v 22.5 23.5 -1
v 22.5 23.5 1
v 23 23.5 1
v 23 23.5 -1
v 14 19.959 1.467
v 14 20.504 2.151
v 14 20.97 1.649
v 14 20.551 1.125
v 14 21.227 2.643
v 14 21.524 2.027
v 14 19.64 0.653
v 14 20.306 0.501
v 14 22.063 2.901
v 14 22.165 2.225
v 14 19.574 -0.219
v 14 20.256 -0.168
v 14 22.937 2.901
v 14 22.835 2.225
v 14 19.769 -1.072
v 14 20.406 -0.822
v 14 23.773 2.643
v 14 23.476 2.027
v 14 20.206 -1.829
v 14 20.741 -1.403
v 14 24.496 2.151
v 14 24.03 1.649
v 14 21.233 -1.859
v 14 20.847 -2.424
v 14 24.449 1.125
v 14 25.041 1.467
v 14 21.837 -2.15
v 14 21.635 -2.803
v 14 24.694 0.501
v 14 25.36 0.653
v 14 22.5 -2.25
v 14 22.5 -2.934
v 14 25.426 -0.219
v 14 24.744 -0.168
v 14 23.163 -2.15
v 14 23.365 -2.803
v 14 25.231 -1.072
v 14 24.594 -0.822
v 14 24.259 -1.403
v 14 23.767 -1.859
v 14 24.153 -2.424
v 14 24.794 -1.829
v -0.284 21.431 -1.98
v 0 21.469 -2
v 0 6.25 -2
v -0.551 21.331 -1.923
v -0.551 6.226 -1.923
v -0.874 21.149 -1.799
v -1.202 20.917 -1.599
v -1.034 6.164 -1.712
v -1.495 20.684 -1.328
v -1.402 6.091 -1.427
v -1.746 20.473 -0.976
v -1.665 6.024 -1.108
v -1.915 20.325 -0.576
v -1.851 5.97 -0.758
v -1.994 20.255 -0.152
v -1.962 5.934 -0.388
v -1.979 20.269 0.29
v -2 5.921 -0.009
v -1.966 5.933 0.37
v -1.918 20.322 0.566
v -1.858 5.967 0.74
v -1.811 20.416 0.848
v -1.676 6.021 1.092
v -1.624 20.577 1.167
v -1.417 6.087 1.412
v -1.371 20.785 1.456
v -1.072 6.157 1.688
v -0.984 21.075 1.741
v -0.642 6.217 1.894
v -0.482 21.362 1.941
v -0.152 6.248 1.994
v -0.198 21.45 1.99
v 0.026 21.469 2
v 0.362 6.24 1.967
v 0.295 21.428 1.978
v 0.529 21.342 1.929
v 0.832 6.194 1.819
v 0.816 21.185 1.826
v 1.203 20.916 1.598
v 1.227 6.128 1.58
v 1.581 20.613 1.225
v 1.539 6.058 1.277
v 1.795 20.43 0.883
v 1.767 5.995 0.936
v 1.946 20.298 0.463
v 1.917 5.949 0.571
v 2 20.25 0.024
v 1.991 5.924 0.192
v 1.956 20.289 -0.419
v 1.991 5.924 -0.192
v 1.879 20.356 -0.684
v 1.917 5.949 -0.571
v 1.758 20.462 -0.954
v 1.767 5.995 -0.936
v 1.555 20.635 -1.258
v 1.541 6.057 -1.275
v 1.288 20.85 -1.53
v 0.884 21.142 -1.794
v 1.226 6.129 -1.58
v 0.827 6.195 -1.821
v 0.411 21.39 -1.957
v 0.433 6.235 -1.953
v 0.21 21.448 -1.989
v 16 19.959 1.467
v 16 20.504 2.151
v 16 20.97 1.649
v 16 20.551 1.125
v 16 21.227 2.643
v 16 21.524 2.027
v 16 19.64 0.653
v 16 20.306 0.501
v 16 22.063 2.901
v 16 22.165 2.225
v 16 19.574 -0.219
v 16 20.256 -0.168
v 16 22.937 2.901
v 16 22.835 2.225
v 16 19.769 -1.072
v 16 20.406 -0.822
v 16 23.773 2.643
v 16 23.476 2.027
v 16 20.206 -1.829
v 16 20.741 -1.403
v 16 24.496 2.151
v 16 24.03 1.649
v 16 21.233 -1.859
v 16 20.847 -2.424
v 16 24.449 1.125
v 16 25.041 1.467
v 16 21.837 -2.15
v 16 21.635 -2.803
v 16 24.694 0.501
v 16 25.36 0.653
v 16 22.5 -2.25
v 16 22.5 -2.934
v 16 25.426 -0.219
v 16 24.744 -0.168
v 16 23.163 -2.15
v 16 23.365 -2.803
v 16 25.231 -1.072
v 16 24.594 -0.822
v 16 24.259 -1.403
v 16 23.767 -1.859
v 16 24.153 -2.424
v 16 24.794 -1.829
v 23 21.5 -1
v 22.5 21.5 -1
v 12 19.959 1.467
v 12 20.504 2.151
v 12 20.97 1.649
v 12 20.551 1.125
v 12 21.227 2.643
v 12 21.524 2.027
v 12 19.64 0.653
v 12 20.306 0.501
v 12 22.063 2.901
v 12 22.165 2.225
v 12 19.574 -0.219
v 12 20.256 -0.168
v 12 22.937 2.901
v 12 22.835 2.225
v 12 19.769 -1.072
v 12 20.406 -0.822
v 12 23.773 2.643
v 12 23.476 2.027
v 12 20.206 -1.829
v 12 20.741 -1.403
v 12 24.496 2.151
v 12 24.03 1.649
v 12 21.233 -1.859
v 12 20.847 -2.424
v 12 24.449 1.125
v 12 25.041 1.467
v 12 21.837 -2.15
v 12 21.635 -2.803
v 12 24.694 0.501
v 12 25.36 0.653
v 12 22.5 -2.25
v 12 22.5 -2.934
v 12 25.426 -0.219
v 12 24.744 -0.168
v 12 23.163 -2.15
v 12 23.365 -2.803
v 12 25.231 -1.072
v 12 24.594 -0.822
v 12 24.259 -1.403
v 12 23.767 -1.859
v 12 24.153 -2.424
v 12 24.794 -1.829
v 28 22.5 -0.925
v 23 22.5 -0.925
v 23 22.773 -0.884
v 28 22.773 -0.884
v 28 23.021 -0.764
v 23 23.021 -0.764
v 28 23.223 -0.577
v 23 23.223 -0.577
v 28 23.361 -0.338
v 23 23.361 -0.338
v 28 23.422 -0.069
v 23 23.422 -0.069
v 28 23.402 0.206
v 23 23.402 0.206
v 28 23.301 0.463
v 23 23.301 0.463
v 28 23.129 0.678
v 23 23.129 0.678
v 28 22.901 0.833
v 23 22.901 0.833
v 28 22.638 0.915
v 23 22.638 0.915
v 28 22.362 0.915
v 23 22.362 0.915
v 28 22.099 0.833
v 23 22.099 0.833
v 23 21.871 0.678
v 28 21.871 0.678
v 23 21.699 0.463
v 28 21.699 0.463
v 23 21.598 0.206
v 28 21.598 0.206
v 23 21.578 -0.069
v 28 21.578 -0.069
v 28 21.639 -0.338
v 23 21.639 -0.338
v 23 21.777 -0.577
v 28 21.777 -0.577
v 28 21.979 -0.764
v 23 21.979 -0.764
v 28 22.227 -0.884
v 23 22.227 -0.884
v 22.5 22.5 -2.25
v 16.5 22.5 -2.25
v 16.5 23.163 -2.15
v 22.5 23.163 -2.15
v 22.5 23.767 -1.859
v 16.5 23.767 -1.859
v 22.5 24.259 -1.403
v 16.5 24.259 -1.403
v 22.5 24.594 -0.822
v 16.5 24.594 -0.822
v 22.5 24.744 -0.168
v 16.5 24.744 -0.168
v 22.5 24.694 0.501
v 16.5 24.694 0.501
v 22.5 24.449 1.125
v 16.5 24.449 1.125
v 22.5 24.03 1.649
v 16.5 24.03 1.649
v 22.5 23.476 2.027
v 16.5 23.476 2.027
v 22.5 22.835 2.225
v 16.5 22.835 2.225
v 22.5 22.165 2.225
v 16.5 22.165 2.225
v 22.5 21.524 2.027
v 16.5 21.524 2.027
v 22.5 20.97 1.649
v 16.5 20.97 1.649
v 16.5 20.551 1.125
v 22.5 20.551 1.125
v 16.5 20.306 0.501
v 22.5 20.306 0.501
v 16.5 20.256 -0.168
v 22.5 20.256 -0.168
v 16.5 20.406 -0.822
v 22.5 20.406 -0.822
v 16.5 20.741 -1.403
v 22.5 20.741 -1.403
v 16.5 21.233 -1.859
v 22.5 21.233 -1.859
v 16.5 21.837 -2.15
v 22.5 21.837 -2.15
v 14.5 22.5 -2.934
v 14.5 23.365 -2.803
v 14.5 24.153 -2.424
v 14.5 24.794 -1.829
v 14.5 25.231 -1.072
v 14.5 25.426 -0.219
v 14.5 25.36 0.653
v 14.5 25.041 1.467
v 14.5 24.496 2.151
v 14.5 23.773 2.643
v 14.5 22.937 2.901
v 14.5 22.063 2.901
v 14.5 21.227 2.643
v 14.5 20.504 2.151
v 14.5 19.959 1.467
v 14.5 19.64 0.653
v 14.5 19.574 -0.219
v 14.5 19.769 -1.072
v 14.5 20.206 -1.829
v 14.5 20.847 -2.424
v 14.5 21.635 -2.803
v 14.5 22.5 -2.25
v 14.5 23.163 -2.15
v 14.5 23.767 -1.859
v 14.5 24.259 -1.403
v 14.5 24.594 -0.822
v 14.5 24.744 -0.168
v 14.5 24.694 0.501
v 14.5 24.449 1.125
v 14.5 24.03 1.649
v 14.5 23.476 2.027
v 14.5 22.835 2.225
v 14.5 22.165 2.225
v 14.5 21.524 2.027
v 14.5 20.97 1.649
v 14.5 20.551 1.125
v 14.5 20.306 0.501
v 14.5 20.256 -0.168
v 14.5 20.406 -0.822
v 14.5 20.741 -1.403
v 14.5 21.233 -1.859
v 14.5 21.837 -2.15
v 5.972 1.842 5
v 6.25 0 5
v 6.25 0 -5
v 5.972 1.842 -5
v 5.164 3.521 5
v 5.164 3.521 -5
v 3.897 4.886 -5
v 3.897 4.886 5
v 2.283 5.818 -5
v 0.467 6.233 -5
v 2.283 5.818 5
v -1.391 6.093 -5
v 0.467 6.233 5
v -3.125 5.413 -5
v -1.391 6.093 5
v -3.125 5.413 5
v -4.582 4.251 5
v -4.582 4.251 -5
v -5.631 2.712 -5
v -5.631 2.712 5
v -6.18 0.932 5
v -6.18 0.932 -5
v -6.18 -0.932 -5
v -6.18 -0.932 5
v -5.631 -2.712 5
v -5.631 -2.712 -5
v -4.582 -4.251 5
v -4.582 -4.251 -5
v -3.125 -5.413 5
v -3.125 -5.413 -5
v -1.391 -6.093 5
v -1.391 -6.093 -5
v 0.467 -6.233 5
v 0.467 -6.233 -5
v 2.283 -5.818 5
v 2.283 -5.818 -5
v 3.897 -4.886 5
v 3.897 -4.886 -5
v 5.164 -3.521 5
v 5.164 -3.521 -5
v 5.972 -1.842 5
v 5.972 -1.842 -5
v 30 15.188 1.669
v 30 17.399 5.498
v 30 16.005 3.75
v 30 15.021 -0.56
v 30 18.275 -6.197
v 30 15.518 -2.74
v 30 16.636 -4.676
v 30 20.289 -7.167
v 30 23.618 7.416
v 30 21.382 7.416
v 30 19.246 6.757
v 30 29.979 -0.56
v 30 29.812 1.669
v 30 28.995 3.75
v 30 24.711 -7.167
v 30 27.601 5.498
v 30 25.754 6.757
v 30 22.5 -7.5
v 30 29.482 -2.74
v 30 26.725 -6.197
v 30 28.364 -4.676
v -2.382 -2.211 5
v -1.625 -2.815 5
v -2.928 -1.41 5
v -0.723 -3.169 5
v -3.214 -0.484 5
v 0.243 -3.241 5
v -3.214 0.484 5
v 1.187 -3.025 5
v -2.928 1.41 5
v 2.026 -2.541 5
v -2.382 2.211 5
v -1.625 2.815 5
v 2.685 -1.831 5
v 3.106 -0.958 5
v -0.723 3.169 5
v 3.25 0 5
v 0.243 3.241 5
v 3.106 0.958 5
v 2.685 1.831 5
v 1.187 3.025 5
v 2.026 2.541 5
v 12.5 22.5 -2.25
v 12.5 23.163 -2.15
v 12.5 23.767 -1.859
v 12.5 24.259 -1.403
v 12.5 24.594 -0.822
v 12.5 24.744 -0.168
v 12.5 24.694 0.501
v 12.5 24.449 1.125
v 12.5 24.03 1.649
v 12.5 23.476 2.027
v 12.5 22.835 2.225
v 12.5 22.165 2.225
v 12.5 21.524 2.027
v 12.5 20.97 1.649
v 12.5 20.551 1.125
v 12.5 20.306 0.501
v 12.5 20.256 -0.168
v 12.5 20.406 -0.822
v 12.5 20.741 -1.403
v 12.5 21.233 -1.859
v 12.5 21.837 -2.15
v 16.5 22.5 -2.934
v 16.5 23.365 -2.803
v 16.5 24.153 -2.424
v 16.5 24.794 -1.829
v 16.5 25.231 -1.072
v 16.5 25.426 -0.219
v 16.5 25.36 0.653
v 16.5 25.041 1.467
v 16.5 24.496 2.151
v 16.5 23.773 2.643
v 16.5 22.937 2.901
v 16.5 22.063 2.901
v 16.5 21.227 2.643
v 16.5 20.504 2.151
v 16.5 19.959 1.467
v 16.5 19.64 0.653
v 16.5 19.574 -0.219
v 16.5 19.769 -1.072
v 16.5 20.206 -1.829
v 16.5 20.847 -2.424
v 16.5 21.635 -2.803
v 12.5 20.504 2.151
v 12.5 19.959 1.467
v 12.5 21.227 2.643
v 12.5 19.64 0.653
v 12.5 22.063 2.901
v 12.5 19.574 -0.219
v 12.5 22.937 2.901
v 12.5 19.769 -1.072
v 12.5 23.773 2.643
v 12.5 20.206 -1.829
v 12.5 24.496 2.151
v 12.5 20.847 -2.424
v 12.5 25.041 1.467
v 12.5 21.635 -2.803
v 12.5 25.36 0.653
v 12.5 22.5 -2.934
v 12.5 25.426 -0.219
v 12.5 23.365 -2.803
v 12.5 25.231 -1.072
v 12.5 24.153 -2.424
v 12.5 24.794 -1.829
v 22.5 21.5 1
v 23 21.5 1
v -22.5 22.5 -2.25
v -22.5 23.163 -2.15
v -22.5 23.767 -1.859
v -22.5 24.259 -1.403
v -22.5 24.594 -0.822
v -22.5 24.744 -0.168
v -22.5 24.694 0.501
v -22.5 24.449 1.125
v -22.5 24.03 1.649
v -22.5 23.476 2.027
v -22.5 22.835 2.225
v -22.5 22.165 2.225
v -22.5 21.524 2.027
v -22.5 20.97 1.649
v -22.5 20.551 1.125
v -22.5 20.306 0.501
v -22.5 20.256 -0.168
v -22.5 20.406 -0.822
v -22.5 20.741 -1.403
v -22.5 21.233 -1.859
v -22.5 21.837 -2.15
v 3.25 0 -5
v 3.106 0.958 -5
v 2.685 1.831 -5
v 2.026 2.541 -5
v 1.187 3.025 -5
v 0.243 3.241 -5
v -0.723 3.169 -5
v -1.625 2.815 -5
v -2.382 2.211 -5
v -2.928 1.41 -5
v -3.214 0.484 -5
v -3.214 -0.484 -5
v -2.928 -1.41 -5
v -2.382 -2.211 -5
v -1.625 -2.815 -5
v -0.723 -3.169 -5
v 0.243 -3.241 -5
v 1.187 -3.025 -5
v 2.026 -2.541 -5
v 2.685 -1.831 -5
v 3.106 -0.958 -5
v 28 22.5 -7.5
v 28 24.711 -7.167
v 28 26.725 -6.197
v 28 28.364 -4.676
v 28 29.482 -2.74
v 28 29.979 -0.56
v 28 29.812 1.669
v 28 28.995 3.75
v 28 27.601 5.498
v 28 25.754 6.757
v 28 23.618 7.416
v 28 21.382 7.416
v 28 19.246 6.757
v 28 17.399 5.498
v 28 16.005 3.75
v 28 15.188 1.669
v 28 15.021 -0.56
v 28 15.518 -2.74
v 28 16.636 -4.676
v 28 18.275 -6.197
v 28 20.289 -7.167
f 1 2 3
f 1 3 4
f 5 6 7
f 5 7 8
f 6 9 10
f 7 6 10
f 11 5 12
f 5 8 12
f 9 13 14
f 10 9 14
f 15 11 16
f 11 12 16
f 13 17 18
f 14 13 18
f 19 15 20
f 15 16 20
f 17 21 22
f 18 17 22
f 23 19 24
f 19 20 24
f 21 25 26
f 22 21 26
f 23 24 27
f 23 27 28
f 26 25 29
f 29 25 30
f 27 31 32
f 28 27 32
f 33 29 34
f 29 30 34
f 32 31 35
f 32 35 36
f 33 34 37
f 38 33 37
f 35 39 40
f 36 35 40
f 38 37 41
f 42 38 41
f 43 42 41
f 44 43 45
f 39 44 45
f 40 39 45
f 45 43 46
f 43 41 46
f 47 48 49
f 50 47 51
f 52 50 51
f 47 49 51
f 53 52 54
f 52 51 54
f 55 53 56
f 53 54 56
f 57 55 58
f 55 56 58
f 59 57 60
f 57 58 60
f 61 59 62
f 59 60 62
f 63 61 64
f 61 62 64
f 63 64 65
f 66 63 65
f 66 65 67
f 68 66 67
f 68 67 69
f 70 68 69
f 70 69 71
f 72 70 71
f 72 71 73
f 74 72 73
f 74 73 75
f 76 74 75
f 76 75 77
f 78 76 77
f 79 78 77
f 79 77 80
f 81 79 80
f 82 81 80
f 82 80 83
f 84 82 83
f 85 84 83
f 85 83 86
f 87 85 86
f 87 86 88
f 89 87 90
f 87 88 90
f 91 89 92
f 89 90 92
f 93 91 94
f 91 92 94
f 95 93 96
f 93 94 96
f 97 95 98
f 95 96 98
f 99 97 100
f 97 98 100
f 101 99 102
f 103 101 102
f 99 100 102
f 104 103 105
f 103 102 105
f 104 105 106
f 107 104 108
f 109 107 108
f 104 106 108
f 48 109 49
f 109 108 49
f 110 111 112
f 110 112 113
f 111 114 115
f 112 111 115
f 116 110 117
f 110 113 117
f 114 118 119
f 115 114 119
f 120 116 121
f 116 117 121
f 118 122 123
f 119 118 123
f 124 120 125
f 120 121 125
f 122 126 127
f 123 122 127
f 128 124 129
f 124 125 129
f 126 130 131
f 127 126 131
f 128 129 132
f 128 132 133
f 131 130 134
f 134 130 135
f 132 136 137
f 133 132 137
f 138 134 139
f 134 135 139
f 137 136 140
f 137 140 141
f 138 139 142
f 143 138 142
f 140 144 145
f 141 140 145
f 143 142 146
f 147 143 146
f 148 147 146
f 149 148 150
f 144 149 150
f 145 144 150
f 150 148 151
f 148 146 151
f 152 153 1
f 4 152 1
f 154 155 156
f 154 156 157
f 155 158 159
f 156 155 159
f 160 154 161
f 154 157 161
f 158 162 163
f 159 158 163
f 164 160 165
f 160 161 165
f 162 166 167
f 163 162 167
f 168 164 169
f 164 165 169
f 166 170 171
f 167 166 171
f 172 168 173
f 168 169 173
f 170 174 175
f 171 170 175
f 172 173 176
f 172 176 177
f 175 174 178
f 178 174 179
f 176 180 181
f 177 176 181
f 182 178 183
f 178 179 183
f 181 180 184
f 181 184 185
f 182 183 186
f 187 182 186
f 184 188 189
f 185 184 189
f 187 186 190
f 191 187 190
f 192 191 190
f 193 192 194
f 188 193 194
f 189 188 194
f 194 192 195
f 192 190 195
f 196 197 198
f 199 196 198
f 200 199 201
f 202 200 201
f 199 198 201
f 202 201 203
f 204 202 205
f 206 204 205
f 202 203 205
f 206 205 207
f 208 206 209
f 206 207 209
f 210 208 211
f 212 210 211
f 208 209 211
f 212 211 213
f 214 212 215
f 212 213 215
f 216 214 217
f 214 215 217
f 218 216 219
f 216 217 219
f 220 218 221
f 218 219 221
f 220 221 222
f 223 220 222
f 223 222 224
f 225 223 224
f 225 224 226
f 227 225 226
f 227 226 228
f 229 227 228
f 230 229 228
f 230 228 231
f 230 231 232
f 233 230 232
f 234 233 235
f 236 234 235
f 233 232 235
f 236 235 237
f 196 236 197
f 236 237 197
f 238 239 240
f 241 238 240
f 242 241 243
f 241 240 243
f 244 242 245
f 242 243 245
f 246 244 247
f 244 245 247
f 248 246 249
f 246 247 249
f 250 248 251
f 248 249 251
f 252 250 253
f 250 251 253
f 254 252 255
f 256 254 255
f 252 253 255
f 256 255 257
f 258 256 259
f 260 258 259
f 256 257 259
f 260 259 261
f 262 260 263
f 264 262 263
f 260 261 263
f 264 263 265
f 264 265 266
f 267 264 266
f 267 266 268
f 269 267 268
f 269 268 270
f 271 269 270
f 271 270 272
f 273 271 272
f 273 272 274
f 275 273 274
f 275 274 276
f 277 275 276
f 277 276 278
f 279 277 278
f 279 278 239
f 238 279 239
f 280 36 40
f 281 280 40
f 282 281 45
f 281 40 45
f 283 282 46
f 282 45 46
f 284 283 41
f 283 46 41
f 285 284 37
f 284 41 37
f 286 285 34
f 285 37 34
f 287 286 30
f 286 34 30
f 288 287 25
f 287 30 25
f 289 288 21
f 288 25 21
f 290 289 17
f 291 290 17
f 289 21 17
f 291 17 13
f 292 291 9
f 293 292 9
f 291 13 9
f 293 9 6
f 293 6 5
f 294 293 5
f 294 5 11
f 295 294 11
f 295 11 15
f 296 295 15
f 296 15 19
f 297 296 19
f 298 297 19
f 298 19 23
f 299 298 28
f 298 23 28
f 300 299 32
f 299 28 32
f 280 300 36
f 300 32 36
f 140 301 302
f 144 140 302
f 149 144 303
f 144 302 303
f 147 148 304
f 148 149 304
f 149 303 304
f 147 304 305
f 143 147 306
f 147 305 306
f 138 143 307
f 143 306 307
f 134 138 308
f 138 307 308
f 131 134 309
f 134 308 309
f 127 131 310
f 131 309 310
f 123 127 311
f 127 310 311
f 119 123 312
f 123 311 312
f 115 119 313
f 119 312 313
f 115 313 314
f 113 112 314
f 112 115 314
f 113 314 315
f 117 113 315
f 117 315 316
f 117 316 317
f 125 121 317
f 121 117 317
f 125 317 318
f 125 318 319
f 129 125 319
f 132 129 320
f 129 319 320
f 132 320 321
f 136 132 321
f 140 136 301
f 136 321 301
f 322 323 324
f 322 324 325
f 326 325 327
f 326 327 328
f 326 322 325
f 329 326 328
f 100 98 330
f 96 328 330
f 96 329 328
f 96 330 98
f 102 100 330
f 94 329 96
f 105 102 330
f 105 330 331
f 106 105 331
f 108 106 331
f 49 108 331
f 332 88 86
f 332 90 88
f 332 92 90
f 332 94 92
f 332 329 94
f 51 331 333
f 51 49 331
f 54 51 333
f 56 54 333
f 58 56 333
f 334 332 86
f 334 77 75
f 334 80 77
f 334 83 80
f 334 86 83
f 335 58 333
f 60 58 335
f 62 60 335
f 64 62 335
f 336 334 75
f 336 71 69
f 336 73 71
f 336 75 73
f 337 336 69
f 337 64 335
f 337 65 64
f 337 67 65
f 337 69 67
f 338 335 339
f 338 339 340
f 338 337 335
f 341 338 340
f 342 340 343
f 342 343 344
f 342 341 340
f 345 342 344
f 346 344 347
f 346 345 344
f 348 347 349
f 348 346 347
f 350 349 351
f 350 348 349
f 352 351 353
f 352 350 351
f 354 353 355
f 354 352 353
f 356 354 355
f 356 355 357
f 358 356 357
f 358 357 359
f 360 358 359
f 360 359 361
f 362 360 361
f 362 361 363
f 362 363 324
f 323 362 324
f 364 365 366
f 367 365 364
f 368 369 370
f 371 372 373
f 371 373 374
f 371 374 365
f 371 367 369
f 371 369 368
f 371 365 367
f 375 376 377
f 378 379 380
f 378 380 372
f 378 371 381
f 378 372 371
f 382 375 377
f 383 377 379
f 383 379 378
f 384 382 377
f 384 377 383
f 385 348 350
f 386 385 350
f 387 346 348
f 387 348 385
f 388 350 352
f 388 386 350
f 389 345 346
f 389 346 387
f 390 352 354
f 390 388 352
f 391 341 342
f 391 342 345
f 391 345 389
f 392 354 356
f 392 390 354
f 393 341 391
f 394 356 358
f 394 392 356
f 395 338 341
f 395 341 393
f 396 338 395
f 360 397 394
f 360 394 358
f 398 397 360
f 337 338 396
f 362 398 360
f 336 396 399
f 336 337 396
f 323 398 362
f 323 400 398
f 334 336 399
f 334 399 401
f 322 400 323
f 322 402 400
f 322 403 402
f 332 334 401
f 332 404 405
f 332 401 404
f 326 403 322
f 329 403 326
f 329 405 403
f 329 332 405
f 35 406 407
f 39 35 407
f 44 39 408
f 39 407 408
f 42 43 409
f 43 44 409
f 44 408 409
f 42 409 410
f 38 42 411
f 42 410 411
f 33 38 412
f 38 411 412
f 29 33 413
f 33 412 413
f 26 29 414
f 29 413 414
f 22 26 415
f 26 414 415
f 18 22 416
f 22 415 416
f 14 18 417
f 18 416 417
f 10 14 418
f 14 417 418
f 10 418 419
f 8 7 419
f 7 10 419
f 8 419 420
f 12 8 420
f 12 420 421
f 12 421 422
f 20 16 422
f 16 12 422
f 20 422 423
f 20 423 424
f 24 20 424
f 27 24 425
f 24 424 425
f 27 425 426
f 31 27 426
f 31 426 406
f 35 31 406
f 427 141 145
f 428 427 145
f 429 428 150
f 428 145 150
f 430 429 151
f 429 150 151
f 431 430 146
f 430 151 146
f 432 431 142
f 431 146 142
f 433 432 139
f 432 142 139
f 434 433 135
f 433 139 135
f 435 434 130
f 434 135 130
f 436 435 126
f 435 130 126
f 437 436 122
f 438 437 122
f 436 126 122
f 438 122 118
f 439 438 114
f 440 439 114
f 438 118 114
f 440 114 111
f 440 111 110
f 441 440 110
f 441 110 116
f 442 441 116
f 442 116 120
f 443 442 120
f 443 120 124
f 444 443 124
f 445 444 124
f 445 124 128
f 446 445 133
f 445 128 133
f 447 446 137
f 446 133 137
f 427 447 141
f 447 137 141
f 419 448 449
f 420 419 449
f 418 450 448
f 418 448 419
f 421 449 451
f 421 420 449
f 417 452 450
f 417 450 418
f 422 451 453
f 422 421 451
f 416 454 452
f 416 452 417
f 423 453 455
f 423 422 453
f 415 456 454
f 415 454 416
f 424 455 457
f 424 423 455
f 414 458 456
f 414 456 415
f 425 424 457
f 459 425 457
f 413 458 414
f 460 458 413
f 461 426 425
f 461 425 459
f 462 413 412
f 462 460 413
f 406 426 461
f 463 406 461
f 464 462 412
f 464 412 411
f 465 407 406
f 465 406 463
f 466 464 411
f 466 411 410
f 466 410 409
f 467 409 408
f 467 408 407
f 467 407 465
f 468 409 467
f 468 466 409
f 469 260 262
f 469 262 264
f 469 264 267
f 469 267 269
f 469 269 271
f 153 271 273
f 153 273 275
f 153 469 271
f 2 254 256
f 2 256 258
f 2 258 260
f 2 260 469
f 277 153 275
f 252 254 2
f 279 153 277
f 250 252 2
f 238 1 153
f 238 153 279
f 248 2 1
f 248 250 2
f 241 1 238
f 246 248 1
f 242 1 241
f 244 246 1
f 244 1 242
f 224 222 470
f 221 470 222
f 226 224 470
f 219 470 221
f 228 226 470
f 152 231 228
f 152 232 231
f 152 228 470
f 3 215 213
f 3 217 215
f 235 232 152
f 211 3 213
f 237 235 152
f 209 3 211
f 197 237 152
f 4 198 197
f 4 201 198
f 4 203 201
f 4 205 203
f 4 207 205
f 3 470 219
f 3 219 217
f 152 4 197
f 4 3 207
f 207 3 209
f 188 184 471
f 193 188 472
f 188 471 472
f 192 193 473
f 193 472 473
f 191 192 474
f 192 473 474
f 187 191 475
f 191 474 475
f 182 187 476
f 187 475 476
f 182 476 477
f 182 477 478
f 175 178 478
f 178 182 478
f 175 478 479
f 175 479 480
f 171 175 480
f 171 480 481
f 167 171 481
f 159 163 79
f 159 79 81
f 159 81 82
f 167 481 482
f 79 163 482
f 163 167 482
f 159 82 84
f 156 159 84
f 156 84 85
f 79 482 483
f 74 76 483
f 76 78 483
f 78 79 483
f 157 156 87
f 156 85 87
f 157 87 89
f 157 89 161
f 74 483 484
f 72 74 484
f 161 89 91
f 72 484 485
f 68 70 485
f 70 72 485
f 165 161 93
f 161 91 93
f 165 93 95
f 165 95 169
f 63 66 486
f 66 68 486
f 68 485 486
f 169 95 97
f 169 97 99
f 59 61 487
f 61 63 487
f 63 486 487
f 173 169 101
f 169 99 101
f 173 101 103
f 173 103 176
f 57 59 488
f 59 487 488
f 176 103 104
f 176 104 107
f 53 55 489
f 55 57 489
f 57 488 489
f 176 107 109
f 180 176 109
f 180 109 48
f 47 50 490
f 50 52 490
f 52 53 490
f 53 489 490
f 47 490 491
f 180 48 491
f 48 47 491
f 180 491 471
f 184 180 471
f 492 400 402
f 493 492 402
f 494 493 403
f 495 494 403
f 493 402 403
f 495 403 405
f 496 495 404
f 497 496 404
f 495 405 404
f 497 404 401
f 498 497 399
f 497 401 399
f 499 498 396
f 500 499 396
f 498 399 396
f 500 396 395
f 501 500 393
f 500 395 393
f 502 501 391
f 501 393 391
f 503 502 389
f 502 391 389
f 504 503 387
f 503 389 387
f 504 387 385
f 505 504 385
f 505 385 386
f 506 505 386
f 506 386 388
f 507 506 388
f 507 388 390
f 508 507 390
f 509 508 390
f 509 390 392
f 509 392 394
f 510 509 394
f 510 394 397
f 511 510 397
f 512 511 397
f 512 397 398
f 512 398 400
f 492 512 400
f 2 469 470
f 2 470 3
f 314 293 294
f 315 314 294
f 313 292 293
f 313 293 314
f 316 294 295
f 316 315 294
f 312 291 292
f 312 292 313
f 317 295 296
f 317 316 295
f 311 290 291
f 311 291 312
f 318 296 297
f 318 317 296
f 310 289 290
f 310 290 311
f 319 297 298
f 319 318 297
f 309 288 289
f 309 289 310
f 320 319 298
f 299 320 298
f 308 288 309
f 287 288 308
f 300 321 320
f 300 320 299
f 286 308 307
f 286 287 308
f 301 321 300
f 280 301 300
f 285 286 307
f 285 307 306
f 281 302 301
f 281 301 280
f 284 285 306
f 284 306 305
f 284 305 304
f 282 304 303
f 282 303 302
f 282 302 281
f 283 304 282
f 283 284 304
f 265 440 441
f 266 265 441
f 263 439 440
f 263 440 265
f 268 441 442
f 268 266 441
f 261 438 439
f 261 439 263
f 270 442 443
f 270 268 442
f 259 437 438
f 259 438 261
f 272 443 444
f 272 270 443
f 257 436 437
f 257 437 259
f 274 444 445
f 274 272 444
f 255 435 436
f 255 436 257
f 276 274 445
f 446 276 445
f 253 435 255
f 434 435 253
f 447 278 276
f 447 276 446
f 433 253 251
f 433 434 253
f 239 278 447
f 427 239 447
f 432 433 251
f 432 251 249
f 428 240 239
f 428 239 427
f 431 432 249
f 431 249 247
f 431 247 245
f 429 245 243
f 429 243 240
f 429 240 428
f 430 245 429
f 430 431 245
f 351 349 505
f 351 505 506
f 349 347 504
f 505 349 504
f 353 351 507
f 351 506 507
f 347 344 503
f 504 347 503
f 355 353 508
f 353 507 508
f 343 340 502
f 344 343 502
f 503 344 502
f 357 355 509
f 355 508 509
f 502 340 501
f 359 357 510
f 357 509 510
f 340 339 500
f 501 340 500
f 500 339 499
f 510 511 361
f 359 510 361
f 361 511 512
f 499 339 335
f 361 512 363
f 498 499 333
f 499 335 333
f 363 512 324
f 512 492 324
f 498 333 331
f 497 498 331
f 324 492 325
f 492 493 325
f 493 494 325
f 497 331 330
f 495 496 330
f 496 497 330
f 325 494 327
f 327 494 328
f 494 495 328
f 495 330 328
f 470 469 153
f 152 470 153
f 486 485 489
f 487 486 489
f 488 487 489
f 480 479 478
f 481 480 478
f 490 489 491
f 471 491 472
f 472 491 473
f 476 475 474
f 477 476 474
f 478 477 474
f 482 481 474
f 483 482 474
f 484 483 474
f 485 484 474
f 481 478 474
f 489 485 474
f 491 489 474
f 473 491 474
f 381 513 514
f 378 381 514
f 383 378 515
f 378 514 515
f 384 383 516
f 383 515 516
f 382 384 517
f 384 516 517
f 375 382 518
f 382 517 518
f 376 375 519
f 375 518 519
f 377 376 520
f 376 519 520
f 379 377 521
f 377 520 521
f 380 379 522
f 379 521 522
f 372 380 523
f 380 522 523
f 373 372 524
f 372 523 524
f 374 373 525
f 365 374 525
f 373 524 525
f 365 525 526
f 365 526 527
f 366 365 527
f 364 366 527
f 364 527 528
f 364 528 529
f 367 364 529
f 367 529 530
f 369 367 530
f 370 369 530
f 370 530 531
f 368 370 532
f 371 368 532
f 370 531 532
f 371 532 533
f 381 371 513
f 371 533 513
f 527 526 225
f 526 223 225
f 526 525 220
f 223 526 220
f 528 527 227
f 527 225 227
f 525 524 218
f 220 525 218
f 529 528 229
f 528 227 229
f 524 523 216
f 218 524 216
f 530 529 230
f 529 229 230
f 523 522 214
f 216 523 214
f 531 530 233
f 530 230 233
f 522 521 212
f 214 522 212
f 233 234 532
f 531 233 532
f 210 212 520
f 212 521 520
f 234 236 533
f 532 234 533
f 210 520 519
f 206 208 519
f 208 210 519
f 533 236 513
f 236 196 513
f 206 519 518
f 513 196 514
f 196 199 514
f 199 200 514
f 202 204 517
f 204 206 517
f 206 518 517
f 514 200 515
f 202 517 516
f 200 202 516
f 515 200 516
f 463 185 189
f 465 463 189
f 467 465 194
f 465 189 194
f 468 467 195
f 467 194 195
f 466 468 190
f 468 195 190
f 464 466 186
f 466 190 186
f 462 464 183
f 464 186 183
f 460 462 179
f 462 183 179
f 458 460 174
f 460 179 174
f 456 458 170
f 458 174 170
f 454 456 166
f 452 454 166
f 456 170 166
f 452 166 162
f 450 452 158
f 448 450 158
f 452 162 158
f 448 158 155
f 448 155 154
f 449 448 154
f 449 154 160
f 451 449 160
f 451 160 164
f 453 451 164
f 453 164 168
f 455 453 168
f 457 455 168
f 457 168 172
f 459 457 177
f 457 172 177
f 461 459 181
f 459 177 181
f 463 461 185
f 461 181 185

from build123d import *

# Parameters (mm, degrees)
SKETCH2_R           = 6.25
EXTRUDE1_DEPTH      = 5
SKETCH3_R           = 2
EXTRUDE2_DEPTH      = 22.5
EXTRUDE3_DEPTH      = 22.5
EXTRUDE3_DEPTH_BACK = 22.5
SKETCH4_R           = 2.25
SKETCH5_R           = 2.933820517
EXTRUDE4_DEPTH      = 0.5
LPATTERN1_COUNT     = 3
LPATTERN1_PITCH     = 2
SKETCH9_W           = 2
SKETCH9_H           = 2
EXTRUDE6_DEPTH      = 0.5
SKETCH7_R           = 3.25
CUT_EXTRUDE1_DEPTH  = 36.719451677
SKETCH6_R           = 0.925
EXTRUDE7_DEPTH      = 5
SKETCH10_R          = 7.5
EXTRUDE8_DEPTH      = 2


with BuildPart() as part:
    # Sketch2 → Extrude1 (new, symmetric)
    with BuildSketch(Plane.XY):
        Circle(SKETCH2_R)
    extrude(amount=EXTRUDE1_DEPTH, both=True)

    # Sketch3 → Extrude2 (add)
    with BuildSketch(Plane(origin=(0, 0, 0), x_dir=(-1, 0, 0), z_dir=(0, 1, 0))):
        Circle(SKETCH3_R)
    extrude(amount=EXTRUDE2_DEPTH)

    # Sketch4 → Extrude3 (add, two sides: drawn at the far end of the back side and taken through both)
    with BuildSketch(Plane(origin=(0, 0, 0), x_dir=(0, 0, -1), z_dir=(1, 0, 0)).offset(-EXTRUDE3_DEPTH_BACK)):
        with Locations((0, 22.5)):
            Circle(SKETCH4_R)
    extrude(amount=EXTRUDE3_DEPTH + EXTRUDE3_DEPTH_BACK)

    # Sketch5 → Extrude4 (add)
    with BuildSketch(Plane(origin=(12, 0, 0), x_dir=(0, 0, -1), z_dir=(1, 0, 0))):
        with Locations((0, 22.5)):
            Circle(SKETCH5_R)
    extrude4 = extrude(amount=EXTRUDE4_DEPTH)

    # LPattern1: Extrude4 ×3
    with Locations(*[(i * LPATTERN1_PITCH, 0, 0) for i in range(1, LPATTERN1_COUNT)]):
        add(extrude4)

    # Sketch9 → Extrude6 (add)
    with BuildSketch(Plane(origin=(22.5, 0, 0), x_dir=(0, 0, -1), z_dir=(1, 0, 0))):
        with Locations((0, 22.5)):
            Rectangle(SKETCH9_W, SKETCH9_H)
    extrude(amount=EXTRUDE6_DEPTH)

    # Sketch7 → Cut-Extrude1 (cut, through all)
    with BuildSketch(Plane.XY.offset(5)):
        Circle(SKETCH7_R)
    extrude(amount=-CUT_EXTRUDE1_DEPTH, mode=Mode.SUBTRACT)

    # Sketch6 → Extrude7 (add)
    with BuildSketch(Plane(origin=(23, 0, 0), x_dir=(0, 0, -1), z_dir=(1, 0, 0))):
        with Locations((0, 22.5)):
            Circle(SKETCH6_R)
    extrude(amount=EXTRUDE7_DEPTH)

    # Sketch10 → Extrude8 (add)
    with BuildSketch(Plane(origin=(28, 0, 0), x_dir=(0, 0, -1), z_dir=(1, 0, 0))):
        with Locations((0, 22.5)):
            Circle(SKETCH10_R)
    extrude(amount=EXTRUDE8_DEPTH)


solid = part.part
